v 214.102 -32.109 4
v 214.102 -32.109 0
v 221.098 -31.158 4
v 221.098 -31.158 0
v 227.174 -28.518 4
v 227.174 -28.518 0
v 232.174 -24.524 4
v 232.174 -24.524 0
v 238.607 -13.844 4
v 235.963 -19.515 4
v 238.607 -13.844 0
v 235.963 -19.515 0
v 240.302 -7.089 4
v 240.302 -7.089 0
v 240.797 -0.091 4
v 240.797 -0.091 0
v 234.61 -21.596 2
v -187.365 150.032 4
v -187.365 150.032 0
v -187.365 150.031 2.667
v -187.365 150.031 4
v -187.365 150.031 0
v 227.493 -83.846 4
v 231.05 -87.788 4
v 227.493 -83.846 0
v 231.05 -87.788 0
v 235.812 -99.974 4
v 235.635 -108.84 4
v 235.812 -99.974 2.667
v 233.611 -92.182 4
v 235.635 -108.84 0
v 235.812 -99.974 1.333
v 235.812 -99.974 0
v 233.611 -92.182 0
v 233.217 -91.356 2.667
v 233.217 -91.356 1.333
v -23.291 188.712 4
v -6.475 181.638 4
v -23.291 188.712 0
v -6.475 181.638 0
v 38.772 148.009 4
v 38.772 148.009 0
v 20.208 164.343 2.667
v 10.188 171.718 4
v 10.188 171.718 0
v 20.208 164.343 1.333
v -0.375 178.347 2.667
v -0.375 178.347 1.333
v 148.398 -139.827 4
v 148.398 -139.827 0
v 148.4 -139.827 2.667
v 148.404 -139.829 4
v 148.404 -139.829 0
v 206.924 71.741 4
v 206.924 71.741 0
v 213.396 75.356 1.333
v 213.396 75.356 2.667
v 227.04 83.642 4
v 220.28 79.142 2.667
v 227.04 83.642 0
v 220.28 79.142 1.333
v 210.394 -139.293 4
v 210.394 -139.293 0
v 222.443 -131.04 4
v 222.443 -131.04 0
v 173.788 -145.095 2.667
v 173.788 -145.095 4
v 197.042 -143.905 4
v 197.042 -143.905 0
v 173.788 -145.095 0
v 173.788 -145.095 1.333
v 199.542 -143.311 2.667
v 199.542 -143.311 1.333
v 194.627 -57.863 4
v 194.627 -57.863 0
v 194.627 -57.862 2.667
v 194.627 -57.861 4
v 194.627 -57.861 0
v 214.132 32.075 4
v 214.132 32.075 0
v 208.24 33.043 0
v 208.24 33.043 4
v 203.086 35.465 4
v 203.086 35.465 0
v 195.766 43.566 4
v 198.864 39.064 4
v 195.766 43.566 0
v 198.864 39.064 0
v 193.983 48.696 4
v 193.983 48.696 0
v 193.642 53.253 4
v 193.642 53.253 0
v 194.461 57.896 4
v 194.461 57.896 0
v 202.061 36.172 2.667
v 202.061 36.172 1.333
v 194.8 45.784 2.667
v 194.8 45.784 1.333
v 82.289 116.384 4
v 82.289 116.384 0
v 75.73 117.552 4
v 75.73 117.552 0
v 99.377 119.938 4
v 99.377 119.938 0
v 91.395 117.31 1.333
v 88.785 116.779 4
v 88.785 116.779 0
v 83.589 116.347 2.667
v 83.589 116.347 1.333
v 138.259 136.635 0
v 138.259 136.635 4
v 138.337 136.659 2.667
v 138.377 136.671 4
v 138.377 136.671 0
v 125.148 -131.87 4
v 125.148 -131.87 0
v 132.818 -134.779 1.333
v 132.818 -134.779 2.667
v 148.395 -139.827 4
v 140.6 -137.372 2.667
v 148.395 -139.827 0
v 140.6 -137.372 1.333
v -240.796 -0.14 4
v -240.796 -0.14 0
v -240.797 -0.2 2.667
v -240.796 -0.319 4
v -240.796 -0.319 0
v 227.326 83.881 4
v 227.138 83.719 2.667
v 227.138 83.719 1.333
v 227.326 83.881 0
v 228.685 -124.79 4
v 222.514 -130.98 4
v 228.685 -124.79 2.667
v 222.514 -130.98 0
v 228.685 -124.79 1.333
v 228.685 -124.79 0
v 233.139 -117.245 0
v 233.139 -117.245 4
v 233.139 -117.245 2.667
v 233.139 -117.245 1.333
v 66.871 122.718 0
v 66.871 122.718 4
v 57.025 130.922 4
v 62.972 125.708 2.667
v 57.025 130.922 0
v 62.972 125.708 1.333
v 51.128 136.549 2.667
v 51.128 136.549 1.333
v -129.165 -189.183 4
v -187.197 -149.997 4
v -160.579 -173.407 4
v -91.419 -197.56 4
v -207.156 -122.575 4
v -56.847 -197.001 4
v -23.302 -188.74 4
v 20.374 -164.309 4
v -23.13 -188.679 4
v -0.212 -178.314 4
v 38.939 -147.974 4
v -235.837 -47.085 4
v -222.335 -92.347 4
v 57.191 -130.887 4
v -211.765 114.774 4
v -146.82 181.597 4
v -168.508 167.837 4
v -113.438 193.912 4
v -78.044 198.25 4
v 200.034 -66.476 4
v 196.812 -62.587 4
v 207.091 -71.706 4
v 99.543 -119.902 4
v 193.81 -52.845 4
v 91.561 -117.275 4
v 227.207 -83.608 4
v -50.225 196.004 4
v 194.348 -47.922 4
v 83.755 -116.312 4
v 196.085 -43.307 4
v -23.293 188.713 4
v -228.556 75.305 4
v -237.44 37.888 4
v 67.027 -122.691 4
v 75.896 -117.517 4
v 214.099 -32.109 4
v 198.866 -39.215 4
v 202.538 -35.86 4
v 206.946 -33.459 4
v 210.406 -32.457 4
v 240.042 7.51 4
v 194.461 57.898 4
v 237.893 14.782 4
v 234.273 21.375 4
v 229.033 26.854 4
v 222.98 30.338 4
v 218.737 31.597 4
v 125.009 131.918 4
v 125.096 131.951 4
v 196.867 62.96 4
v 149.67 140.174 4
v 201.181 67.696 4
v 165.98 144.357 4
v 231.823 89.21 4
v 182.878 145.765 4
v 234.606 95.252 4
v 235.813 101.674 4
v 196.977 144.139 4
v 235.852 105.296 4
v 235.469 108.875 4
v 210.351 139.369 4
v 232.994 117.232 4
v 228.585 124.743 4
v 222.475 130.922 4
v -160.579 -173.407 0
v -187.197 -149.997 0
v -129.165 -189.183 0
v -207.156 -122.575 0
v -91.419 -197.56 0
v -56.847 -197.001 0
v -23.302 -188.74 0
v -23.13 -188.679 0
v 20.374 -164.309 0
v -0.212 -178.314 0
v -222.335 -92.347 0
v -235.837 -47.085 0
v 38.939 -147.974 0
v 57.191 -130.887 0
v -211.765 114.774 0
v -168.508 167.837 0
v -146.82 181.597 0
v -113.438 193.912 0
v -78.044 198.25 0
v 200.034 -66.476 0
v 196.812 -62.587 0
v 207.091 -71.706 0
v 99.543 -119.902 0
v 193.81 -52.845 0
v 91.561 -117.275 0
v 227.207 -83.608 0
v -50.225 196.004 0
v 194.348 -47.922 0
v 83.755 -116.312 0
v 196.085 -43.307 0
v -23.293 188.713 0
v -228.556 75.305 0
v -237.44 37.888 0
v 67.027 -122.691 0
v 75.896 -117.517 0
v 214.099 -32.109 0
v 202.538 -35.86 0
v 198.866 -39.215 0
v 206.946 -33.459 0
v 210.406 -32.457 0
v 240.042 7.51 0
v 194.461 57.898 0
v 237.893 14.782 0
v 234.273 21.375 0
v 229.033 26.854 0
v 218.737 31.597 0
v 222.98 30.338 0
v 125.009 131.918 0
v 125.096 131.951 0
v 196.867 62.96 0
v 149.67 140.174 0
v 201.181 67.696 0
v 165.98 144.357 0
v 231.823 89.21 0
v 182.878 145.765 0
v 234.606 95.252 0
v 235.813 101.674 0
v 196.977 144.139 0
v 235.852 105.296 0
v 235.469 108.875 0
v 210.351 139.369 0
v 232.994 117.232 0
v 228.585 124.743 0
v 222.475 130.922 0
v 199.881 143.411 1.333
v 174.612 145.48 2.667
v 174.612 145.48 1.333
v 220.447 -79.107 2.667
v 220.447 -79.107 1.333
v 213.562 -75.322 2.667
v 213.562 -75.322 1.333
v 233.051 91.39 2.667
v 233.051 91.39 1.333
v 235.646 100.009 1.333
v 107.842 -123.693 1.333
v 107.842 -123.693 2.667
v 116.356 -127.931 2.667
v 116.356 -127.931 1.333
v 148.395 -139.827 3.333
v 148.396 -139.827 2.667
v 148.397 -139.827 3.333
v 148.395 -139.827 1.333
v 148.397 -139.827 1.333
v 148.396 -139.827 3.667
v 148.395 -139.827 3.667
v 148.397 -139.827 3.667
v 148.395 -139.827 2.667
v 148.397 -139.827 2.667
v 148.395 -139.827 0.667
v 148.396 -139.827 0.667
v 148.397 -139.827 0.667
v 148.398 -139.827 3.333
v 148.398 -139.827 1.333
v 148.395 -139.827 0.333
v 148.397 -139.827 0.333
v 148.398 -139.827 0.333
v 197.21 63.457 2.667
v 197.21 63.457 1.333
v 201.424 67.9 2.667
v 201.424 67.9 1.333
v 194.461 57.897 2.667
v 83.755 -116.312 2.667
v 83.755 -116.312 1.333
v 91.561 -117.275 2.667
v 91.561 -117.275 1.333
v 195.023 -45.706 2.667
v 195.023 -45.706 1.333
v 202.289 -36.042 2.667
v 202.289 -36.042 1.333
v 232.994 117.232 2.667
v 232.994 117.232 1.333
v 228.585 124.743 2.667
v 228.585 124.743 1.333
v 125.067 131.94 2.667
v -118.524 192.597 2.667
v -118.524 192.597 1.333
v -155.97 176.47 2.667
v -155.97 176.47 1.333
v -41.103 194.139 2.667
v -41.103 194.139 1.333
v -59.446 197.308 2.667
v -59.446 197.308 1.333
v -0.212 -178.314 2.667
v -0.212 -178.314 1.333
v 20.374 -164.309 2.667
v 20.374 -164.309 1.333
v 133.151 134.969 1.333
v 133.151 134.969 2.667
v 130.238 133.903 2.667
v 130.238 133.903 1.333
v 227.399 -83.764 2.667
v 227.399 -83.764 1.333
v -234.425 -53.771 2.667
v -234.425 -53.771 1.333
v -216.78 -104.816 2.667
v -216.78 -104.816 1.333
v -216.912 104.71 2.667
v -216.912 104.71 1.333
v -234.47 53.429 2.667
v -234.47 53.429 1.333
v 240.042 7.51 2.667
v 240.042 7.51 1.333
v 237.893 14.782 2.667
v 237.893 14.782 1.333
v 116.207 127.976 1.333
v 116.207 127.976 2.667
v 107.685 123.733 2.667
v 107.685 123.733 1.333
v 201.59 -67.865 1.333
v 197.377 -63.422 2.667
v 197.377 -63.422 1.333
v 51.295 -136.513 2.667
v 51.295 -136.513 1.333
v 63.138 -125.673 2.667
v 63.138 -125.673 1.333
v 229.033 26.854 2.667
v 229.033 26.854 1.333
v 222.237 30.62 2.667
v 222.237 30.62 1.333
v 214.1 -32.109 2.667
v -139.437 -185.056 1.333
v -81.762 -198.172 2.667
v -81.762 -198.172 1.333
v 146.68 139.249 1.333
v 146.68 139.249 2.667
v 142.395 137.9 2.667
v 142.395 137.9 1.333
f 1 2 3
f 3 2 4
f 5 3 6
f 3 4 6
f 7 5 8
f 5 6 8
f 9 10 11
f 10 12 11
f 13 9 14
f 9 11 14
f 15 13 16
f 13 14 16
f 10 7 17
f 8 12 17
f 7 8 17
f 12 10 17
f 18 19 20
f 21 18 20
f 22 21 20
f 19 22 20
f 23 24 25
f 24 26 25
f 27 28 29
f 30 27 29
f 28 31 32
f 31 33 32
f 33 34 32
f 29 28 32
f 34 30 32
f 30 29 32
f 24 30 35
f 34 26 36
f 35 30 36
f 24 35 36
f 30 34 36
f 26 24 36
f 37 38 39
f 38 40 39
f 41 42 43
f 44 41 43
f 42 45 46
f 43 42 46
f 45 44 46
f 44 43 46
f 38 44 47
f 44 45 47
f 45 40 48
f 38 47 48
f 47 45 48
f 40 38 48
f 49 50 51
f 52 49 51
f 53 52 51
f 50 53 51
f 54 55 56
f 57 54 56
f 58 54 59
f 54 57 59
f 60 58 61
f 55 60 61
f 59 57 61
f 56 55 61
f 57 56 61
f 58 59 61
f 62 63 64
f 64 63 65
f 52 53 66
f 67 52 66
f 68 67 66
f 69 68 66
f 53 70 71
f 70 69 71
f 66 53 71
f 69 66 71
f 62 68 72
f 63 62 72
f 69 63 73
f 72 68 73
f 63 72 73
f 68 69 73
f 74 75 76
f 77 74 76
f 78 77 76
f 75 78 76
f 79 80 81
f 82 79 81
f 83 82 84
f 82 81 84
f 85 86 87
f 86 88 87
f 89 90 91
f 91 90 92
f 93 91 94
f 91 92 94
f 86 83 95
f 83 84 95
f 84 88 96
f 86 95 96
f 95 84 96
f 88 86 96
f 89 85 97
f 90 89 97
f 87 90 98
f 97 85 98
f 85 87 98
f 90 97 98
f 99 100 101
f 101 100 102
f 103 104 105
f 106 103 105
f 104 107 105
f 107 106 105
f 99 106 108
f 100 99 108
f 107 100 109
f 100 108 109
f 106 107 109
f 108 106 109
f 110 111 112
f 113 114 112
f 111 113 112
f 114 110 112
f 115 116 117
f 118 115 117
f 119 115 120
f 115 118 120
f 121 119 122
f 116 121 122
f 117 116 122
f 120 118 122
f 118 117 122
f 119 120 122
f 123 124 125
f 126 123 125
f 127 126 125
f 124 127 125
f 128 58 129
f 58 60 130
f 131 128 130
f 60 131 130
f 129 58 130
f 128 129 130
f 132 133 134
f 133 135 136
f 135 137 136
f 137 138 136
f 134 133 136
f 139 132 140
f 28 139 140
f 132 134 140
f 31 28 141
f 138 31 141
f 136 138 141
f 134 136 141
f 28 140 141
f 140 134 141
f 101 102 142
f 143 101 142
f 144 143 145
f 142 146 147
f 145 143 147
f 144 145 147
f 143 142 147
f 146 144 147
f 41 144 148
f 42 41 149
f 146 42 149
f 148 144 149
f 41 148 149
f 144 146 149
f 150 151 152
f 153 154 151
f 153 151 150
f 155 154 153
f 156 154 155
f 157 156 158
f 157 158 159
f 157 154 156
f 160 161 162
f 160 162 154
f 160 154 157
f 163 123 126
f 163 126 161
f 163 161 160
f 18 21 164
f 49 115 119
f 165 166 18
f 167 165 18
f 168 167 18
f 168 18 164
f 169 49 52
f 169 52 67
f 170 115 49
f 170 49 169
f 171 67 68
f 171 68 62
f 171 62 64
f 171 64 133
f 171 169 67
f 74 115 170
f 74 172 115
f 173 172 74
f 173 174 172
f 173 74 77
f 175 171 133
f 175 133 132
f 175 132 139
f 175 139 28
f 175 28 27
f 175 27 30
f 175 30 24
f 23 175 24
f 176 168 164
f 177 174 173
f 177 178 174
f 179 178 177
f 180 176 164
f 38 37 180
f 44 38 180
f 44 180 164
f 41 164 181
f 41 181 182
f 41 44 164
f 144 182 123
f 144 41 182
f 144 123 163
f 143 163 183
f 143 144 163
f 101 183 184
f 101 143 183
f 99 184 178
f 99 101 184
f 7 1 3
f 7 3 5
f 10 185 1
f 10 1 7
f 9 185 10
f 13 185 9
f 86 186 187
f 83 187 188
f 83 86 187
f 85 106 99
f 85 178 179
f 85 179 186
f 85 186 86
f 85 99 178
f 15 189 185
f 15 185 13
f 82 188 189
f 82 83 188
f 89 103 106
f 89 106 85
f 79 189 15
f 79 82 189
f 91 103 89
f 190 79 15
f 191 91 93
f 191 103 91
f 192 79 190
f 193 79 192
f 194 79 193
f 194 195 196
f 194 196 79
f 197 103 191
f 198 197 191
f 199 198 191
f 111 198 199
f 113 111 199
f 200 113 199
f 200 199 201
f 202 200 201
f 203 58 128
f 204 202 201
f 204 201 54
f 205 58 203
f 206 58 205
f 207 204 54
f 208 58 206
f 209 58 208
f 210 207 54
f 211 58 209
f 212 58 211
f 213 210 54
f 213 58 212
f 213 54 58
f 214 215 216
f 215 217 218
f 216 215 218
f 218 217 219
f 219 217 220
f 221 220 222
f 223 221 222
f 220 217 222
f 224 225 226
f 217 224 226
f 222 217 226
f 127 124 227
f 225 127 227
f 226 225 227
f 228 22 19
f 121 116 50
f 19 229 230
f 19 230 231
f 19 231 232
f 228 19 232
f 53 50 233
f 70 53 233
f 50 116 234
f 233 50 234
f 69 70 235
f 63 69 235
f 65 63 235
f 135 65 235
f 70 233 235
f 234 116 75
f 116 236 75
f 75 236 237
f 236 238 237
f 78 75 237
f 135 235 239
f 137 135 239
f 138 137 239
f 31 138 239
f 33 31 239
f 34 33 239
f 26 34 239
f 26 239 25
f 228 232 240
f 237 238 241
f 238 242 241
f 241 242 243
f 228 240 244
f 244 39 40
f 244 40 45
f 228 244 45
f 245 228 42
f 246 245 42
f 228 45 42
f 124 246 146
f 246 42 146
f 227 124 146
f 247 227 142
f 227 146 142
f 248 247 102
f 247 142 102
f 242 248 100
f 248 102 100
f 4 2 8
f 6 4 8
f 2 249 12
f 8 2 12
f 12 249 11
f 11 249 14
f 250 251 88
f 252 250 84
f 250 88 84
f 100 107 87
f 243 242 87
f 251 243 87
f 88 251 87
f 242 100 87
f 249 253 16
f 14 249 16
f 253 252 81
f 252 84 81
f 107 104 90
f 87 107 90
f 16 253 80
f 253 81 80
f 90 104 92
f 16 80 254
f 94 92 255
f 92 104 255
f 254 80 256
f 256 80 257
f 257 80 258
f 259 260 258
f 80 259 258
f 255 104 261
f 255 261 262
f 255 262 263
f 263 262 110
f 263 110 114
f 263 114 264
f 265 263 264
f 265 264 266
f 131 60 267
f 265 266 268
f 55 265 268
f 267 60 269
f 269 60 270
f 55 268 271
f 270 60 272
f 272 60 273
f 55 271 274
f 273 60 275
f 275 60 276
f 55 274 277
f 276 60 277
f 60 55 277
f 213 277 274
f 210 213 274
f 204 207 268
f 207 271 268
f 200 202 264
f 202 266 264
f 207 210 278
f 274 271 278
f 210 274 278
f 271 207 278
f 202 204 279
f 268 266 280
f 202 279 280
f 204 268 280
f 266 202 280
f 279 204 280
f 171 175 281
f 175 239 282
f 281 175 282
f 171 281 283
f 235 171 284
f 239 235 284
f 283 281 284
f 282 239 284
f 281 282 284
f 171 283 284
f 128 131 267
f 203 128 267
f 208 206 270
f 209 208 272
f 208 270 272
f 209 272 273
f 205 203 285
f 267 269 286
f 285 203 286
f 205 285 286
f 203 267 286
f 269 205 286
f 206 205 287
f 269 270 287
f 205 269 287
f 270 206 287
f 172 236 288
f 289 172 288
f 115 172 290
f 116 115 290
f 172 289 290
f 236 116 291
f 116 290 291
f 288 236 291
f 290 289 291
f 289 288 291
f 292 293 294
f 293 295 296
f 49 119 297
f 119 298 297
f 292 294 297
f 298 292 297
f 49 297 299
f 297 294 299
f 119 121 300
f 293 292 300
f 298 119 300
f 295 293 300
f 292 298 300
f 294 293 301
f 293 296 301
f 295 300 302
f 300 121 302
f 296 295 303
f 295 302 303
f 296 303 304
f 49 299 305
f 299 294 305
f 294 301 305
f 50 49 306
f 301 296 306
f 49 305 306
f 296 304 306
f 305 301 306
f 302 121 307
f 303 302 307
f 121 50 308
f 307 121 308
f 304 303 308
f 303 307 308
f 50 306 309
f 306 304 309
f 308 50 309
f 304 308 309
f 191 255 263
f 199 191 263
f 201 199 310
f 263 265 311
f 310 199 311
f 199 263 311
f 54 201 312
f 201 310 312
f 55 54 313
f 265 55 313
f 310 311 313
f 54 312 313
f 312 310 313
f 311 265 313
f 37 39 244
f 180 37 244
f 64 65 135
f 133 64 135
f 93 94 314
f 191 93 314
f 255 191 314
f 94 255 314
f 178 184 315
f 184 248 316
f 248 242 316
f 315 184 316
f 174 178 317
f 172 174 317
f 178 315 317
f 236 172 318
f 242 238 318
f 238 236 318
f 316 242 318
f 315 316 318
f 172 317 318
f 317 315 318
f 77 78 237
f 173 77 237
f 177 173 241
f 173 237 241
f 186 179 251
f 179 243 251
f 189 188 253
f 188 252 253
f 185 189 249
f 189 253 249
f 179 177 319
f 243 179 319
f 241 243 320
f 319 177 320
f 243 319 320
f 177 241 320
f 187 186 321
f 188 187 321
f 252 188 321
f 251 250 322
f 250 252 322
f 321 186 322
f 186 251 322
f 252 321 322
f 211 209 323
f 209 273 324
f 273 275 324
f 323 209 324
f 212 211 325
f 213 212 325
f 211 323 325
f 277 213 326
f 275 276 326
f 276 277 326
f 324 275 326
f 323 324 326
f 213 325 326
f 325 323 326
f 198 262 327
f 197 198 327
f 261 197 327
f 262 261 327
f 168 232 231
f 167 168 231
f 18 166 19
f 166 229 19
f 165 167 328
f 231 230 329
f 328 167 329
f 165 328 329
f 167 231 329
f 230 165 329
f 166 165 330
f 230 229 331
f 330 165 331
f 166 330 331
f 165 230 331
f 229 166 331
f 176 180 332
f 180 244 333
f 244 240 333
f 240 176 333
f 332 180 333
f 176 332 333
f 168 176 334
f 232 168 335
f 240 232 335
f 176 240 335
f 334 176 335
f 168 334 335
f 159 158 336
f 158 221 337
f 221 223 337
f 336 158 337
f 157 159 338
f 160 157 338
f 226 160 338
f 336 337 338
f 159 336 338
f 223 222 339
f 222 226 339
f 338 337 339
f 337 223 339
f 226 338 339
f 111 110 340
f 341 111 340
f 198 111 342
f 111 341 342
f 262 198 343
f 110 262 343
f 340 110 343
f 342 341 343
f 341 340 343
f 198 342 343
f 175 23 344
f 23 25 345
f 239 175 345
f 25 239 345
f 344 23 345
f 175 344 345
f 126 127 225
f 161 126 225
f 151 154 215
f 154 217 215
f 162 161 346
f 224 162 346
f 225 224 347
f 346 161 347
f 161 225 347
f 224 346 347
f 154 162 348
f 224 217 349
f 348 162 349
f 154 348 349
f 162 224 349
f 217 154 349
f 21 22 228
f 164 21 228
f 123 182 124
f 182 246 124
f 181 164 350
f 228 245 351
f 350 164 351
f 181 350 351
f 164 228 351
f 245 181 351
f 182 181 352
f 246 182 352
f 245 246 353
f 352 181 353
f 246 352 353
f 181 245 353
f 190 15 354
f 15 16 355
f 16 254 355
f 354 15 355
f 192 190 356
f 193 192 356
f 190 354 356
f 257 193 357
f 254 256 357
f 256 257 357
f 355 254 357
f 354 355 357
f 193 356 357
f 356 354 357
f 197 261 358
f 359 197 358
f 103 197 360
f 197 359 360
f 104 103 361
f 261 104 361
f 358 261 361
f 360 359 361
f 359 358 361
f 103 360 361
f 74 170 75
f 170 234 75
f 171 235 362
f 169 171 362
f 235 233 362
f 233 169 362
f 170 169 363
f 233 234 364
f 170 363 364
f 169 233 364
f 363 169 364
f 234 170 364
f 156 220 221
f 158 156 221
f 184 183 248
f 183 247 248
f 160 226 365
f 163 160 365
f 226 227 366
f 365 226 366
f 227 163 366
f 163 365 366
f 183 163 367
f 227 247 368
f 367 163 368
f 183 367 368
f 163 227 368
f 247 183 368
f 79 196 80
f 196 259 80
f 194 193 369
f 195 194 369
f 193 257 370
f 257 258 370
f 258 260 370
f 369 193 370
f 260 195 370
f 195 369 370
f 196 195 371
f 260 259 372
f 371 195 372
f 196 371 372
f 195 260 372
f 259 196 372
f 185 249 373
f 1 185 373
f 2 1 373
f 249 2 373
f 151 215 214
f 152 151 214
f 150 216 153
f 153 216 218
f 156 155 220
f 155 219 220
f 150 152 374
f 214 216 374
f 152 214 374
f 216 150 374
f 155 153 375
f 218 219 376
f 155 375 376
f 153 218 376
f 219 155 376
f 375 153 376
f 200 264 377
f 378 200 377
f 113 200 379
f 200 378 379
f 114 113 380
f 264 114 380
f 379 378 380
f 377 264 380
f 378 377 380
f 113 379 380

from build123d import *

# Parameters (mm, degrees)
F1_DEPTH = 4


# Not quite as in the source:
# - ends of sketch curves that miss each other by under 0.0002 mm in the source are joined


with BuildPart() as f1:
    # F0 (on Top) → F1 (new body)
    with BuildSketch(Plane.XY):
        with BuildLine():
            add(Edge.make_bspline(
                [(-23.29275, 188.71263), (-40.744167, 195.27633), (-59.410257, 198.41332), (-78.043821, 198.249744)],
                knots=[0, 0, 0, 0, 1, 1, 1, 1], degree=3))
            add(Edge.make_bspline(
                [(-78.043821, 198.249744), (-119.036105, 197.889891), (-160.001254, 181.57068), (-187.364696, 150.031637)],
                knots=[0, 0, 0, 0, 1, 1, 1, 1], degree=3))
            add(Edge.make_bspline(
                [(-187.364696, 150.031637), (-187.364865, 150.031442), (-187.364978, 150.031355), (-187.365261, 150.031072)],
                knots=[0, 0, 0, 0, 1, 1, 1, 1], degree=3))
            add(Edge.make_bspline(
                [(-187.365261, 150.031072), (-223.157197, 108.912672), (-239.83493, 53.349791), (-240.796196, -0.140351)],
                knots=[0, 0, 0, 0, 1, 1, 1, 1], degree=3))
            add(Edge.make_bspline(
                [(-240.796196, -0.140351), (-240.797267, -0.200062), (-240.797267, -0.259787), (-240.796196, -0.319498)],
                knots=[0, 0, 0, 0, 1, 1, 1, 1], degree=3))
            add(Edge.make_bspline(
                [(-240.796196, -0.319498), (-239.840937, -53.821863), (-222.970632, -108.900151), (-187.197127, -149.997041)],
                knots=[0, 0, 0, 0, 1, 1, 1, 1], degree=3))
            add(Edge.make_bspline(
                [(-187.197127, -149.997041), (-147.436926, -195.824596), (-79.112374, -209.648856), (-23.30153, -188.74031)],
                knots=[0, 0, 0, 0, 1, 1, 1, 1], degree=3))
            Line((-23.30153, -188.74031), (-23.130102, -188.679124))
            add(Edge.make_bspline(
                [(-23.130102, -188.679124), (1.059853, -180.570344), (21.278733, -165.037933), (38.938938, -147.973536)],
                knots=[0, 0, 0, 0, 1, 1, 1, 1], degree=3))
            add(Edge.make_bspline(
                [(38.938938, -147.973536), (52.026993, -136.892306), (62.204773, -123.641634), (75.896277, -117.517243)],
                knots=[0, 0, 0, 0, 1, 1, 1, 1], degree=3))
            add(Edge.make_bspline(
                [(75.896277, -117.517243), (83.85737, -115.06047), (91.397501, -116.61066), (99.542858, -119.902331)],
                knots=[0, 0, 0, 0, 1, 1, 1, 1], degree=3))
            add(Edge.make_bspline(
                [(99.542858, -119.902331), (107.756908, -123.2218), (116.195437, -128.328386), (125.148457, -131.870331)],
                knots=[0, 0, 0, 0, 1, 1, 1, 1], degree=3))
            add(Edge.make_bspline(
                [(125.148457, -131.870331), (132.727224, -134.996817), (140.627979, -137.381228), (148.394876, -139.826571)],
                knots=[0, 0, 0, 0, 1, 1, 1, 1], degree=3))
            add(Edge.make_bspline(
                [(148.394876, -139.826571), (148.394876, -139.826853), (148.397698, -139.826853), (148.397698, -139.826571)],
                knots=[0, 0, 0, 0, 1, 1, 1, 1], degree=3))
            add(Edge.make_bspline(
                [(148.397698, -139.826571), (148.40052, -139.826571), (148.401649, -139.829393), (148.403907, -139.829393)],
                knots=[0, 0, 0, 0, 1, 1, 1, 1], degree=3))
            add(Edge.make_bspline(
                [(148.403907, -139.829393), (172.528911, -147.473466), (202.043599, -149.701441), (222.443157, -131.039695)],
                knots=[0, 0, 0, 0, 1, 1, 1, 1], degree=3))
            Line((222.443157, -131.039695), (222.513713, -130.980174))
            add(Edge.make_bspline(
                [(222.513713, -130.980174), (229.464818, -125.631639), (234.197007, -117.510187), (235.635381, -108.839502)],
                knots=[0, 0, 0, 0, 1, 1, 1, 1], degree=3))
            add(Edge.make_bspline(
                [(235.635381, -108.839502), (237.078806, -100.138393), (234.900785, -90.513402), (227.492818, -83.846297)],
                knots=[0, 0, 0, 0, 1, 1, 1, 1], degree=3))
            add(Edge.make_bspline(
                [(227.492818, -83.846297), (227.400465, -83.76321), (227.305045, -83.683596), (227.206758, -83.607622)],
                knots=[0, 0, 0, 0, 1, 1, 1, 1], degree=3))
            add(Edge.make_bspline(
                [(227.206758, -83.607622), (220.687876, -78.567613), (213.176701, -75.418408), (207.090691, -71.705791)],
                knots=[0, 0, 0, 0, 1, 1, 1, 1], degree=3))
            add(Edge.make_bspline(
                [(207.090691, -71.705791), (201.005472, -67.993635), (196.586267, -64.15215), (194.627165, -57.863121)],
                knots=[0, 0, 0, 0, 1, 1, 1, 1], degree=3))
            add(Edge.make_bspline(
                [(194.627165, -57.863121), (194.626911, -57.862275), (194.627165, -57.86171), (194.627165, -57.860864)],
                knots=[0, 0, 0, 0, 1, 1, 1, 1], degree=3))
            add(Edge.make_bspline(
                [(194.627165, -57.860864), (190.811493, -45.539507), (200.792423, -32.097127), (214.099398, -32.108636)],
                knots=[0, 0, 0, 0, 1, 1, 1, 1], degree=3))
            add(Edge.make_bspline(
                [(214.099398, -32.108636), (214.100339, -32.108637), (214.10128, -32.108637), (214.10222, -32.108636)],
                knots=[0, 0, 0, 0, 1, 1, 1, 1], degree=3))
            add(Edge.make_bspline(
                [(214.10222, -32.108636), (222.998711, -32.113688), (230.233817, -27.742198), (234.609616, -21.595858)],
                knots=[0, 0, 0, 0, 1, 1, 1, 1], degree=3))
            add(Edge.make_bspline(
                [(234.609616, -21.595858), (238.985415, -15.449518), (240.879719, -7.737472), (240.796999, -0.090745)],
                knots=[0, 0, 0, 0, 1, 1, 1, 1], degree=3))
            add(Edge.make_bspline(
                [(240.796999, -0.090745), (240.714308, 7.555981), (238.653296, 15.239885), (234.273376, 21.375232)],
                knots=[0, 0, 0, 0, 1, 1, 1, 1], degree=3))
            add(Edge.make_bspline(
                [(234.273376, 21.375232), (229.893457, 27.51058), (222.80982, 31.975787), (214.131967, 32.074872)],
                knots=[0, 0, 0, 0, 1, 1, 1, 1], degree=3))
            add(Edge.make_bspline(
                [(214.131967, 32.074872), (200.3598011228, 32.409862366), (190.6341888263, 45.5397705426), (194.460767, 57.895973)],
                knots=[0.0012785739, 0.0012785739, 0.0012785739, 0.0012785739, 1, 1, 1, 1], degree=3))
            add(Edge.make_bspline(
                [(194.460767, 57.895973), (194.460993, 57.89682), (194.460767, 57.897384), (194.460767, 57.898231)],
                knots=[0, 0, 0, 0, 1, 1, 1, 1], degree=3))
            add(Edge.make_bspline(
                [(194.460767, 57.898231), (196.419841, 64.18724), (200.839074, 68.028874), (206.924293, 71.740898)],
                knots=[0, 0, 0, 0, 1, 1, 1, 1], degree=3))
            add(Edge.make_bspline(
                [(206.924293, 71.740898), (213.010274, 75.453396), (220.521421, 78.602146), (227.040331, 83.642189)],
                knots=[0, 0, 0, 0, 1, 1, 1, 1], degree=3))
            add(Edge.make_bspline(
                [(227.040331, 83.642189), (227.138629, 83.718163), (227.234058, 83.797777), (227.32642, 83.880865)],
                knots=[0, 0, 0, 0, 1, 1, 1, 1], degree=3))
            add(Edge.make_bspline(
                [(227.32642, 83.880865), (234.734386, 90.548), (236.91238, 100.173387), (235.468954, 108.87462)],
                knots=[0, 0, 0, 0, 1, 1, 1, 1], degree=3))
            add(Edge.make_bspline(
                [(235.468954, 108.87462), (234.0392708475, 117.493181786), (229.358044954, 125.5721274646), (222.4753975178, 130.9216294129)],
                knots=[0, 0, 0, 0, 0.9904989081, 0.9904989081, 0.9904989081, 0.9904989081], degree=3))
            add(Edge.make_bspline(
                [(222.4753975178, 130.9216294129), (202.2201967941, 149.6382929896), (173.4466709537, 148.1501016784), (149.669561, 140.174275)],
                knots=[0.0028310813, 0.0028310813, 0.0028310813, 0.0028310813, 1, 1, 1, 1], degree=3))
            add(Edge.make_bspline(
                [(149.669561, 140.174275), (147.849594, 139.64173), (141.739935, 137.657691), (138.376805, 136.671302)],
                knots=[0, 0, 0, 0, 1, 1, 1, 1], degree=3))
            add(Edge.make_bspline(
                [(138.376805, 136.671302), (138.337334, 136.659662), (138.298008, 136.647535), (138.258836, 136.634923)],
                knots=[0, 0, 0, 0, 1, 1, 1, 1], degree=3))
            add(Edge.make_bspline(
                [(138.258836, 136.634923), (130.579485, 134.174462), (132.826877, 134.841689), (125.095823, 131.950695)],
                knots=[0, 0, 0, 0, 1, 1, 1, 1], degree=3))
            add(Edge.make_bspline(
                [(125.095823, 131.950695), (125.066878, 131.939938), (125.038034, 131.928913), (125.009293, 131.917621)],
                knots=[0, 0, 0, 0, 1, 1, 1, 1], degree=3))
            add(Edge.make_bspline(
                [(125.009293, 131.917621), (116.046028, 128.375264), (107.599145, 123.260353), (99.376657, 119.937508)],
                knots=[0, 0, 0, 0, 1, 1, 1, 1], degree=3))
            add(Edge.make_bspline(
                [(99.376657, 119.937508), (91.231301, 116.645826), (83.69117, 115.095644), (75.730076, 117.5524)],
                knots=[0, 0, 0, 0, 1, 1, 1, 1], degree=3))
            add(Edge.make_bspline(
                [(75.730076, 117.5524), (62.038375, 123.676899), (51.860539, 136.927923), (38.772201, 148.009249)],
                knots=[0, 0, 0, 0, 1, 1, 1, 1], degree=3))
            add(Edge.make_bspline(
                [(38.772201, 148.009249), (21.11234, 165.071874), (0.895704, 180.602741), (-23.291056, 188.712066)],
                knots=[0, 0, 0, 0, 1, 1, 1, 1], degree=3))
            Line((-23.291056, 188.712066), (-23.29275, 188.71263))
        make_face()
        with BuildLine():
            add(Edge.make_bspline(
                [(222.4753975178, 130.9216294129), (222.4093775909, 130.9729430579), (222.3431551094, 131.0240055645), (222.276731, 131.074815)],
                knots=[0.9904989081, 0.9904989081, 0.9904989081, 0.9904989081, 1, 1, 1, 1], degree=3))
            add(Edge.make_bspline(
                [(222.647712, 130.761724), (222.5903427082, 130.8151888768), (222.5329044444, 130.8684905764), (222.4753975178, 130.9216294129)],
                knots=[0, 0, 0, 0, 0.0028310813, 0.0028310813, 0.0028310813, 0.0028310813], degree=3))
            Line((222.647712, 130.761724), (222.276731, 131.074815))
        make_face(mode=Mode.SUBTRACT)
        with BuildLine():
            add(Edge.make_bspline(
                [(222.647712, 130.761724), (222.5903427082, 130.8151888768), (222.5329044444, 130.8684905764), (222.4753975178, 130.9216294129)],
                knots=[0, 0, 0, 0, 0.0028310813, 0.0028310813, 0.0028310813, 0.0028310813], degree=3))
            add(Edge.make_bspline(
                [(222.4753975178, 130.9216294129), (222.4093775909, 130.9729430579), (222.3431551094, 131.0240055645), (222.276731, 131.074815)],
                knots=[0.9904989081, 0.9904989081, 0.9904989081, 0.9904989081, 1, 1, 1, 1], degree=3))
            Line((222.276731, 131.074815), (222.647712, 130.761724))
        make_face()
    extrude(amount=F1_DEPTH)


solid = f1.part
